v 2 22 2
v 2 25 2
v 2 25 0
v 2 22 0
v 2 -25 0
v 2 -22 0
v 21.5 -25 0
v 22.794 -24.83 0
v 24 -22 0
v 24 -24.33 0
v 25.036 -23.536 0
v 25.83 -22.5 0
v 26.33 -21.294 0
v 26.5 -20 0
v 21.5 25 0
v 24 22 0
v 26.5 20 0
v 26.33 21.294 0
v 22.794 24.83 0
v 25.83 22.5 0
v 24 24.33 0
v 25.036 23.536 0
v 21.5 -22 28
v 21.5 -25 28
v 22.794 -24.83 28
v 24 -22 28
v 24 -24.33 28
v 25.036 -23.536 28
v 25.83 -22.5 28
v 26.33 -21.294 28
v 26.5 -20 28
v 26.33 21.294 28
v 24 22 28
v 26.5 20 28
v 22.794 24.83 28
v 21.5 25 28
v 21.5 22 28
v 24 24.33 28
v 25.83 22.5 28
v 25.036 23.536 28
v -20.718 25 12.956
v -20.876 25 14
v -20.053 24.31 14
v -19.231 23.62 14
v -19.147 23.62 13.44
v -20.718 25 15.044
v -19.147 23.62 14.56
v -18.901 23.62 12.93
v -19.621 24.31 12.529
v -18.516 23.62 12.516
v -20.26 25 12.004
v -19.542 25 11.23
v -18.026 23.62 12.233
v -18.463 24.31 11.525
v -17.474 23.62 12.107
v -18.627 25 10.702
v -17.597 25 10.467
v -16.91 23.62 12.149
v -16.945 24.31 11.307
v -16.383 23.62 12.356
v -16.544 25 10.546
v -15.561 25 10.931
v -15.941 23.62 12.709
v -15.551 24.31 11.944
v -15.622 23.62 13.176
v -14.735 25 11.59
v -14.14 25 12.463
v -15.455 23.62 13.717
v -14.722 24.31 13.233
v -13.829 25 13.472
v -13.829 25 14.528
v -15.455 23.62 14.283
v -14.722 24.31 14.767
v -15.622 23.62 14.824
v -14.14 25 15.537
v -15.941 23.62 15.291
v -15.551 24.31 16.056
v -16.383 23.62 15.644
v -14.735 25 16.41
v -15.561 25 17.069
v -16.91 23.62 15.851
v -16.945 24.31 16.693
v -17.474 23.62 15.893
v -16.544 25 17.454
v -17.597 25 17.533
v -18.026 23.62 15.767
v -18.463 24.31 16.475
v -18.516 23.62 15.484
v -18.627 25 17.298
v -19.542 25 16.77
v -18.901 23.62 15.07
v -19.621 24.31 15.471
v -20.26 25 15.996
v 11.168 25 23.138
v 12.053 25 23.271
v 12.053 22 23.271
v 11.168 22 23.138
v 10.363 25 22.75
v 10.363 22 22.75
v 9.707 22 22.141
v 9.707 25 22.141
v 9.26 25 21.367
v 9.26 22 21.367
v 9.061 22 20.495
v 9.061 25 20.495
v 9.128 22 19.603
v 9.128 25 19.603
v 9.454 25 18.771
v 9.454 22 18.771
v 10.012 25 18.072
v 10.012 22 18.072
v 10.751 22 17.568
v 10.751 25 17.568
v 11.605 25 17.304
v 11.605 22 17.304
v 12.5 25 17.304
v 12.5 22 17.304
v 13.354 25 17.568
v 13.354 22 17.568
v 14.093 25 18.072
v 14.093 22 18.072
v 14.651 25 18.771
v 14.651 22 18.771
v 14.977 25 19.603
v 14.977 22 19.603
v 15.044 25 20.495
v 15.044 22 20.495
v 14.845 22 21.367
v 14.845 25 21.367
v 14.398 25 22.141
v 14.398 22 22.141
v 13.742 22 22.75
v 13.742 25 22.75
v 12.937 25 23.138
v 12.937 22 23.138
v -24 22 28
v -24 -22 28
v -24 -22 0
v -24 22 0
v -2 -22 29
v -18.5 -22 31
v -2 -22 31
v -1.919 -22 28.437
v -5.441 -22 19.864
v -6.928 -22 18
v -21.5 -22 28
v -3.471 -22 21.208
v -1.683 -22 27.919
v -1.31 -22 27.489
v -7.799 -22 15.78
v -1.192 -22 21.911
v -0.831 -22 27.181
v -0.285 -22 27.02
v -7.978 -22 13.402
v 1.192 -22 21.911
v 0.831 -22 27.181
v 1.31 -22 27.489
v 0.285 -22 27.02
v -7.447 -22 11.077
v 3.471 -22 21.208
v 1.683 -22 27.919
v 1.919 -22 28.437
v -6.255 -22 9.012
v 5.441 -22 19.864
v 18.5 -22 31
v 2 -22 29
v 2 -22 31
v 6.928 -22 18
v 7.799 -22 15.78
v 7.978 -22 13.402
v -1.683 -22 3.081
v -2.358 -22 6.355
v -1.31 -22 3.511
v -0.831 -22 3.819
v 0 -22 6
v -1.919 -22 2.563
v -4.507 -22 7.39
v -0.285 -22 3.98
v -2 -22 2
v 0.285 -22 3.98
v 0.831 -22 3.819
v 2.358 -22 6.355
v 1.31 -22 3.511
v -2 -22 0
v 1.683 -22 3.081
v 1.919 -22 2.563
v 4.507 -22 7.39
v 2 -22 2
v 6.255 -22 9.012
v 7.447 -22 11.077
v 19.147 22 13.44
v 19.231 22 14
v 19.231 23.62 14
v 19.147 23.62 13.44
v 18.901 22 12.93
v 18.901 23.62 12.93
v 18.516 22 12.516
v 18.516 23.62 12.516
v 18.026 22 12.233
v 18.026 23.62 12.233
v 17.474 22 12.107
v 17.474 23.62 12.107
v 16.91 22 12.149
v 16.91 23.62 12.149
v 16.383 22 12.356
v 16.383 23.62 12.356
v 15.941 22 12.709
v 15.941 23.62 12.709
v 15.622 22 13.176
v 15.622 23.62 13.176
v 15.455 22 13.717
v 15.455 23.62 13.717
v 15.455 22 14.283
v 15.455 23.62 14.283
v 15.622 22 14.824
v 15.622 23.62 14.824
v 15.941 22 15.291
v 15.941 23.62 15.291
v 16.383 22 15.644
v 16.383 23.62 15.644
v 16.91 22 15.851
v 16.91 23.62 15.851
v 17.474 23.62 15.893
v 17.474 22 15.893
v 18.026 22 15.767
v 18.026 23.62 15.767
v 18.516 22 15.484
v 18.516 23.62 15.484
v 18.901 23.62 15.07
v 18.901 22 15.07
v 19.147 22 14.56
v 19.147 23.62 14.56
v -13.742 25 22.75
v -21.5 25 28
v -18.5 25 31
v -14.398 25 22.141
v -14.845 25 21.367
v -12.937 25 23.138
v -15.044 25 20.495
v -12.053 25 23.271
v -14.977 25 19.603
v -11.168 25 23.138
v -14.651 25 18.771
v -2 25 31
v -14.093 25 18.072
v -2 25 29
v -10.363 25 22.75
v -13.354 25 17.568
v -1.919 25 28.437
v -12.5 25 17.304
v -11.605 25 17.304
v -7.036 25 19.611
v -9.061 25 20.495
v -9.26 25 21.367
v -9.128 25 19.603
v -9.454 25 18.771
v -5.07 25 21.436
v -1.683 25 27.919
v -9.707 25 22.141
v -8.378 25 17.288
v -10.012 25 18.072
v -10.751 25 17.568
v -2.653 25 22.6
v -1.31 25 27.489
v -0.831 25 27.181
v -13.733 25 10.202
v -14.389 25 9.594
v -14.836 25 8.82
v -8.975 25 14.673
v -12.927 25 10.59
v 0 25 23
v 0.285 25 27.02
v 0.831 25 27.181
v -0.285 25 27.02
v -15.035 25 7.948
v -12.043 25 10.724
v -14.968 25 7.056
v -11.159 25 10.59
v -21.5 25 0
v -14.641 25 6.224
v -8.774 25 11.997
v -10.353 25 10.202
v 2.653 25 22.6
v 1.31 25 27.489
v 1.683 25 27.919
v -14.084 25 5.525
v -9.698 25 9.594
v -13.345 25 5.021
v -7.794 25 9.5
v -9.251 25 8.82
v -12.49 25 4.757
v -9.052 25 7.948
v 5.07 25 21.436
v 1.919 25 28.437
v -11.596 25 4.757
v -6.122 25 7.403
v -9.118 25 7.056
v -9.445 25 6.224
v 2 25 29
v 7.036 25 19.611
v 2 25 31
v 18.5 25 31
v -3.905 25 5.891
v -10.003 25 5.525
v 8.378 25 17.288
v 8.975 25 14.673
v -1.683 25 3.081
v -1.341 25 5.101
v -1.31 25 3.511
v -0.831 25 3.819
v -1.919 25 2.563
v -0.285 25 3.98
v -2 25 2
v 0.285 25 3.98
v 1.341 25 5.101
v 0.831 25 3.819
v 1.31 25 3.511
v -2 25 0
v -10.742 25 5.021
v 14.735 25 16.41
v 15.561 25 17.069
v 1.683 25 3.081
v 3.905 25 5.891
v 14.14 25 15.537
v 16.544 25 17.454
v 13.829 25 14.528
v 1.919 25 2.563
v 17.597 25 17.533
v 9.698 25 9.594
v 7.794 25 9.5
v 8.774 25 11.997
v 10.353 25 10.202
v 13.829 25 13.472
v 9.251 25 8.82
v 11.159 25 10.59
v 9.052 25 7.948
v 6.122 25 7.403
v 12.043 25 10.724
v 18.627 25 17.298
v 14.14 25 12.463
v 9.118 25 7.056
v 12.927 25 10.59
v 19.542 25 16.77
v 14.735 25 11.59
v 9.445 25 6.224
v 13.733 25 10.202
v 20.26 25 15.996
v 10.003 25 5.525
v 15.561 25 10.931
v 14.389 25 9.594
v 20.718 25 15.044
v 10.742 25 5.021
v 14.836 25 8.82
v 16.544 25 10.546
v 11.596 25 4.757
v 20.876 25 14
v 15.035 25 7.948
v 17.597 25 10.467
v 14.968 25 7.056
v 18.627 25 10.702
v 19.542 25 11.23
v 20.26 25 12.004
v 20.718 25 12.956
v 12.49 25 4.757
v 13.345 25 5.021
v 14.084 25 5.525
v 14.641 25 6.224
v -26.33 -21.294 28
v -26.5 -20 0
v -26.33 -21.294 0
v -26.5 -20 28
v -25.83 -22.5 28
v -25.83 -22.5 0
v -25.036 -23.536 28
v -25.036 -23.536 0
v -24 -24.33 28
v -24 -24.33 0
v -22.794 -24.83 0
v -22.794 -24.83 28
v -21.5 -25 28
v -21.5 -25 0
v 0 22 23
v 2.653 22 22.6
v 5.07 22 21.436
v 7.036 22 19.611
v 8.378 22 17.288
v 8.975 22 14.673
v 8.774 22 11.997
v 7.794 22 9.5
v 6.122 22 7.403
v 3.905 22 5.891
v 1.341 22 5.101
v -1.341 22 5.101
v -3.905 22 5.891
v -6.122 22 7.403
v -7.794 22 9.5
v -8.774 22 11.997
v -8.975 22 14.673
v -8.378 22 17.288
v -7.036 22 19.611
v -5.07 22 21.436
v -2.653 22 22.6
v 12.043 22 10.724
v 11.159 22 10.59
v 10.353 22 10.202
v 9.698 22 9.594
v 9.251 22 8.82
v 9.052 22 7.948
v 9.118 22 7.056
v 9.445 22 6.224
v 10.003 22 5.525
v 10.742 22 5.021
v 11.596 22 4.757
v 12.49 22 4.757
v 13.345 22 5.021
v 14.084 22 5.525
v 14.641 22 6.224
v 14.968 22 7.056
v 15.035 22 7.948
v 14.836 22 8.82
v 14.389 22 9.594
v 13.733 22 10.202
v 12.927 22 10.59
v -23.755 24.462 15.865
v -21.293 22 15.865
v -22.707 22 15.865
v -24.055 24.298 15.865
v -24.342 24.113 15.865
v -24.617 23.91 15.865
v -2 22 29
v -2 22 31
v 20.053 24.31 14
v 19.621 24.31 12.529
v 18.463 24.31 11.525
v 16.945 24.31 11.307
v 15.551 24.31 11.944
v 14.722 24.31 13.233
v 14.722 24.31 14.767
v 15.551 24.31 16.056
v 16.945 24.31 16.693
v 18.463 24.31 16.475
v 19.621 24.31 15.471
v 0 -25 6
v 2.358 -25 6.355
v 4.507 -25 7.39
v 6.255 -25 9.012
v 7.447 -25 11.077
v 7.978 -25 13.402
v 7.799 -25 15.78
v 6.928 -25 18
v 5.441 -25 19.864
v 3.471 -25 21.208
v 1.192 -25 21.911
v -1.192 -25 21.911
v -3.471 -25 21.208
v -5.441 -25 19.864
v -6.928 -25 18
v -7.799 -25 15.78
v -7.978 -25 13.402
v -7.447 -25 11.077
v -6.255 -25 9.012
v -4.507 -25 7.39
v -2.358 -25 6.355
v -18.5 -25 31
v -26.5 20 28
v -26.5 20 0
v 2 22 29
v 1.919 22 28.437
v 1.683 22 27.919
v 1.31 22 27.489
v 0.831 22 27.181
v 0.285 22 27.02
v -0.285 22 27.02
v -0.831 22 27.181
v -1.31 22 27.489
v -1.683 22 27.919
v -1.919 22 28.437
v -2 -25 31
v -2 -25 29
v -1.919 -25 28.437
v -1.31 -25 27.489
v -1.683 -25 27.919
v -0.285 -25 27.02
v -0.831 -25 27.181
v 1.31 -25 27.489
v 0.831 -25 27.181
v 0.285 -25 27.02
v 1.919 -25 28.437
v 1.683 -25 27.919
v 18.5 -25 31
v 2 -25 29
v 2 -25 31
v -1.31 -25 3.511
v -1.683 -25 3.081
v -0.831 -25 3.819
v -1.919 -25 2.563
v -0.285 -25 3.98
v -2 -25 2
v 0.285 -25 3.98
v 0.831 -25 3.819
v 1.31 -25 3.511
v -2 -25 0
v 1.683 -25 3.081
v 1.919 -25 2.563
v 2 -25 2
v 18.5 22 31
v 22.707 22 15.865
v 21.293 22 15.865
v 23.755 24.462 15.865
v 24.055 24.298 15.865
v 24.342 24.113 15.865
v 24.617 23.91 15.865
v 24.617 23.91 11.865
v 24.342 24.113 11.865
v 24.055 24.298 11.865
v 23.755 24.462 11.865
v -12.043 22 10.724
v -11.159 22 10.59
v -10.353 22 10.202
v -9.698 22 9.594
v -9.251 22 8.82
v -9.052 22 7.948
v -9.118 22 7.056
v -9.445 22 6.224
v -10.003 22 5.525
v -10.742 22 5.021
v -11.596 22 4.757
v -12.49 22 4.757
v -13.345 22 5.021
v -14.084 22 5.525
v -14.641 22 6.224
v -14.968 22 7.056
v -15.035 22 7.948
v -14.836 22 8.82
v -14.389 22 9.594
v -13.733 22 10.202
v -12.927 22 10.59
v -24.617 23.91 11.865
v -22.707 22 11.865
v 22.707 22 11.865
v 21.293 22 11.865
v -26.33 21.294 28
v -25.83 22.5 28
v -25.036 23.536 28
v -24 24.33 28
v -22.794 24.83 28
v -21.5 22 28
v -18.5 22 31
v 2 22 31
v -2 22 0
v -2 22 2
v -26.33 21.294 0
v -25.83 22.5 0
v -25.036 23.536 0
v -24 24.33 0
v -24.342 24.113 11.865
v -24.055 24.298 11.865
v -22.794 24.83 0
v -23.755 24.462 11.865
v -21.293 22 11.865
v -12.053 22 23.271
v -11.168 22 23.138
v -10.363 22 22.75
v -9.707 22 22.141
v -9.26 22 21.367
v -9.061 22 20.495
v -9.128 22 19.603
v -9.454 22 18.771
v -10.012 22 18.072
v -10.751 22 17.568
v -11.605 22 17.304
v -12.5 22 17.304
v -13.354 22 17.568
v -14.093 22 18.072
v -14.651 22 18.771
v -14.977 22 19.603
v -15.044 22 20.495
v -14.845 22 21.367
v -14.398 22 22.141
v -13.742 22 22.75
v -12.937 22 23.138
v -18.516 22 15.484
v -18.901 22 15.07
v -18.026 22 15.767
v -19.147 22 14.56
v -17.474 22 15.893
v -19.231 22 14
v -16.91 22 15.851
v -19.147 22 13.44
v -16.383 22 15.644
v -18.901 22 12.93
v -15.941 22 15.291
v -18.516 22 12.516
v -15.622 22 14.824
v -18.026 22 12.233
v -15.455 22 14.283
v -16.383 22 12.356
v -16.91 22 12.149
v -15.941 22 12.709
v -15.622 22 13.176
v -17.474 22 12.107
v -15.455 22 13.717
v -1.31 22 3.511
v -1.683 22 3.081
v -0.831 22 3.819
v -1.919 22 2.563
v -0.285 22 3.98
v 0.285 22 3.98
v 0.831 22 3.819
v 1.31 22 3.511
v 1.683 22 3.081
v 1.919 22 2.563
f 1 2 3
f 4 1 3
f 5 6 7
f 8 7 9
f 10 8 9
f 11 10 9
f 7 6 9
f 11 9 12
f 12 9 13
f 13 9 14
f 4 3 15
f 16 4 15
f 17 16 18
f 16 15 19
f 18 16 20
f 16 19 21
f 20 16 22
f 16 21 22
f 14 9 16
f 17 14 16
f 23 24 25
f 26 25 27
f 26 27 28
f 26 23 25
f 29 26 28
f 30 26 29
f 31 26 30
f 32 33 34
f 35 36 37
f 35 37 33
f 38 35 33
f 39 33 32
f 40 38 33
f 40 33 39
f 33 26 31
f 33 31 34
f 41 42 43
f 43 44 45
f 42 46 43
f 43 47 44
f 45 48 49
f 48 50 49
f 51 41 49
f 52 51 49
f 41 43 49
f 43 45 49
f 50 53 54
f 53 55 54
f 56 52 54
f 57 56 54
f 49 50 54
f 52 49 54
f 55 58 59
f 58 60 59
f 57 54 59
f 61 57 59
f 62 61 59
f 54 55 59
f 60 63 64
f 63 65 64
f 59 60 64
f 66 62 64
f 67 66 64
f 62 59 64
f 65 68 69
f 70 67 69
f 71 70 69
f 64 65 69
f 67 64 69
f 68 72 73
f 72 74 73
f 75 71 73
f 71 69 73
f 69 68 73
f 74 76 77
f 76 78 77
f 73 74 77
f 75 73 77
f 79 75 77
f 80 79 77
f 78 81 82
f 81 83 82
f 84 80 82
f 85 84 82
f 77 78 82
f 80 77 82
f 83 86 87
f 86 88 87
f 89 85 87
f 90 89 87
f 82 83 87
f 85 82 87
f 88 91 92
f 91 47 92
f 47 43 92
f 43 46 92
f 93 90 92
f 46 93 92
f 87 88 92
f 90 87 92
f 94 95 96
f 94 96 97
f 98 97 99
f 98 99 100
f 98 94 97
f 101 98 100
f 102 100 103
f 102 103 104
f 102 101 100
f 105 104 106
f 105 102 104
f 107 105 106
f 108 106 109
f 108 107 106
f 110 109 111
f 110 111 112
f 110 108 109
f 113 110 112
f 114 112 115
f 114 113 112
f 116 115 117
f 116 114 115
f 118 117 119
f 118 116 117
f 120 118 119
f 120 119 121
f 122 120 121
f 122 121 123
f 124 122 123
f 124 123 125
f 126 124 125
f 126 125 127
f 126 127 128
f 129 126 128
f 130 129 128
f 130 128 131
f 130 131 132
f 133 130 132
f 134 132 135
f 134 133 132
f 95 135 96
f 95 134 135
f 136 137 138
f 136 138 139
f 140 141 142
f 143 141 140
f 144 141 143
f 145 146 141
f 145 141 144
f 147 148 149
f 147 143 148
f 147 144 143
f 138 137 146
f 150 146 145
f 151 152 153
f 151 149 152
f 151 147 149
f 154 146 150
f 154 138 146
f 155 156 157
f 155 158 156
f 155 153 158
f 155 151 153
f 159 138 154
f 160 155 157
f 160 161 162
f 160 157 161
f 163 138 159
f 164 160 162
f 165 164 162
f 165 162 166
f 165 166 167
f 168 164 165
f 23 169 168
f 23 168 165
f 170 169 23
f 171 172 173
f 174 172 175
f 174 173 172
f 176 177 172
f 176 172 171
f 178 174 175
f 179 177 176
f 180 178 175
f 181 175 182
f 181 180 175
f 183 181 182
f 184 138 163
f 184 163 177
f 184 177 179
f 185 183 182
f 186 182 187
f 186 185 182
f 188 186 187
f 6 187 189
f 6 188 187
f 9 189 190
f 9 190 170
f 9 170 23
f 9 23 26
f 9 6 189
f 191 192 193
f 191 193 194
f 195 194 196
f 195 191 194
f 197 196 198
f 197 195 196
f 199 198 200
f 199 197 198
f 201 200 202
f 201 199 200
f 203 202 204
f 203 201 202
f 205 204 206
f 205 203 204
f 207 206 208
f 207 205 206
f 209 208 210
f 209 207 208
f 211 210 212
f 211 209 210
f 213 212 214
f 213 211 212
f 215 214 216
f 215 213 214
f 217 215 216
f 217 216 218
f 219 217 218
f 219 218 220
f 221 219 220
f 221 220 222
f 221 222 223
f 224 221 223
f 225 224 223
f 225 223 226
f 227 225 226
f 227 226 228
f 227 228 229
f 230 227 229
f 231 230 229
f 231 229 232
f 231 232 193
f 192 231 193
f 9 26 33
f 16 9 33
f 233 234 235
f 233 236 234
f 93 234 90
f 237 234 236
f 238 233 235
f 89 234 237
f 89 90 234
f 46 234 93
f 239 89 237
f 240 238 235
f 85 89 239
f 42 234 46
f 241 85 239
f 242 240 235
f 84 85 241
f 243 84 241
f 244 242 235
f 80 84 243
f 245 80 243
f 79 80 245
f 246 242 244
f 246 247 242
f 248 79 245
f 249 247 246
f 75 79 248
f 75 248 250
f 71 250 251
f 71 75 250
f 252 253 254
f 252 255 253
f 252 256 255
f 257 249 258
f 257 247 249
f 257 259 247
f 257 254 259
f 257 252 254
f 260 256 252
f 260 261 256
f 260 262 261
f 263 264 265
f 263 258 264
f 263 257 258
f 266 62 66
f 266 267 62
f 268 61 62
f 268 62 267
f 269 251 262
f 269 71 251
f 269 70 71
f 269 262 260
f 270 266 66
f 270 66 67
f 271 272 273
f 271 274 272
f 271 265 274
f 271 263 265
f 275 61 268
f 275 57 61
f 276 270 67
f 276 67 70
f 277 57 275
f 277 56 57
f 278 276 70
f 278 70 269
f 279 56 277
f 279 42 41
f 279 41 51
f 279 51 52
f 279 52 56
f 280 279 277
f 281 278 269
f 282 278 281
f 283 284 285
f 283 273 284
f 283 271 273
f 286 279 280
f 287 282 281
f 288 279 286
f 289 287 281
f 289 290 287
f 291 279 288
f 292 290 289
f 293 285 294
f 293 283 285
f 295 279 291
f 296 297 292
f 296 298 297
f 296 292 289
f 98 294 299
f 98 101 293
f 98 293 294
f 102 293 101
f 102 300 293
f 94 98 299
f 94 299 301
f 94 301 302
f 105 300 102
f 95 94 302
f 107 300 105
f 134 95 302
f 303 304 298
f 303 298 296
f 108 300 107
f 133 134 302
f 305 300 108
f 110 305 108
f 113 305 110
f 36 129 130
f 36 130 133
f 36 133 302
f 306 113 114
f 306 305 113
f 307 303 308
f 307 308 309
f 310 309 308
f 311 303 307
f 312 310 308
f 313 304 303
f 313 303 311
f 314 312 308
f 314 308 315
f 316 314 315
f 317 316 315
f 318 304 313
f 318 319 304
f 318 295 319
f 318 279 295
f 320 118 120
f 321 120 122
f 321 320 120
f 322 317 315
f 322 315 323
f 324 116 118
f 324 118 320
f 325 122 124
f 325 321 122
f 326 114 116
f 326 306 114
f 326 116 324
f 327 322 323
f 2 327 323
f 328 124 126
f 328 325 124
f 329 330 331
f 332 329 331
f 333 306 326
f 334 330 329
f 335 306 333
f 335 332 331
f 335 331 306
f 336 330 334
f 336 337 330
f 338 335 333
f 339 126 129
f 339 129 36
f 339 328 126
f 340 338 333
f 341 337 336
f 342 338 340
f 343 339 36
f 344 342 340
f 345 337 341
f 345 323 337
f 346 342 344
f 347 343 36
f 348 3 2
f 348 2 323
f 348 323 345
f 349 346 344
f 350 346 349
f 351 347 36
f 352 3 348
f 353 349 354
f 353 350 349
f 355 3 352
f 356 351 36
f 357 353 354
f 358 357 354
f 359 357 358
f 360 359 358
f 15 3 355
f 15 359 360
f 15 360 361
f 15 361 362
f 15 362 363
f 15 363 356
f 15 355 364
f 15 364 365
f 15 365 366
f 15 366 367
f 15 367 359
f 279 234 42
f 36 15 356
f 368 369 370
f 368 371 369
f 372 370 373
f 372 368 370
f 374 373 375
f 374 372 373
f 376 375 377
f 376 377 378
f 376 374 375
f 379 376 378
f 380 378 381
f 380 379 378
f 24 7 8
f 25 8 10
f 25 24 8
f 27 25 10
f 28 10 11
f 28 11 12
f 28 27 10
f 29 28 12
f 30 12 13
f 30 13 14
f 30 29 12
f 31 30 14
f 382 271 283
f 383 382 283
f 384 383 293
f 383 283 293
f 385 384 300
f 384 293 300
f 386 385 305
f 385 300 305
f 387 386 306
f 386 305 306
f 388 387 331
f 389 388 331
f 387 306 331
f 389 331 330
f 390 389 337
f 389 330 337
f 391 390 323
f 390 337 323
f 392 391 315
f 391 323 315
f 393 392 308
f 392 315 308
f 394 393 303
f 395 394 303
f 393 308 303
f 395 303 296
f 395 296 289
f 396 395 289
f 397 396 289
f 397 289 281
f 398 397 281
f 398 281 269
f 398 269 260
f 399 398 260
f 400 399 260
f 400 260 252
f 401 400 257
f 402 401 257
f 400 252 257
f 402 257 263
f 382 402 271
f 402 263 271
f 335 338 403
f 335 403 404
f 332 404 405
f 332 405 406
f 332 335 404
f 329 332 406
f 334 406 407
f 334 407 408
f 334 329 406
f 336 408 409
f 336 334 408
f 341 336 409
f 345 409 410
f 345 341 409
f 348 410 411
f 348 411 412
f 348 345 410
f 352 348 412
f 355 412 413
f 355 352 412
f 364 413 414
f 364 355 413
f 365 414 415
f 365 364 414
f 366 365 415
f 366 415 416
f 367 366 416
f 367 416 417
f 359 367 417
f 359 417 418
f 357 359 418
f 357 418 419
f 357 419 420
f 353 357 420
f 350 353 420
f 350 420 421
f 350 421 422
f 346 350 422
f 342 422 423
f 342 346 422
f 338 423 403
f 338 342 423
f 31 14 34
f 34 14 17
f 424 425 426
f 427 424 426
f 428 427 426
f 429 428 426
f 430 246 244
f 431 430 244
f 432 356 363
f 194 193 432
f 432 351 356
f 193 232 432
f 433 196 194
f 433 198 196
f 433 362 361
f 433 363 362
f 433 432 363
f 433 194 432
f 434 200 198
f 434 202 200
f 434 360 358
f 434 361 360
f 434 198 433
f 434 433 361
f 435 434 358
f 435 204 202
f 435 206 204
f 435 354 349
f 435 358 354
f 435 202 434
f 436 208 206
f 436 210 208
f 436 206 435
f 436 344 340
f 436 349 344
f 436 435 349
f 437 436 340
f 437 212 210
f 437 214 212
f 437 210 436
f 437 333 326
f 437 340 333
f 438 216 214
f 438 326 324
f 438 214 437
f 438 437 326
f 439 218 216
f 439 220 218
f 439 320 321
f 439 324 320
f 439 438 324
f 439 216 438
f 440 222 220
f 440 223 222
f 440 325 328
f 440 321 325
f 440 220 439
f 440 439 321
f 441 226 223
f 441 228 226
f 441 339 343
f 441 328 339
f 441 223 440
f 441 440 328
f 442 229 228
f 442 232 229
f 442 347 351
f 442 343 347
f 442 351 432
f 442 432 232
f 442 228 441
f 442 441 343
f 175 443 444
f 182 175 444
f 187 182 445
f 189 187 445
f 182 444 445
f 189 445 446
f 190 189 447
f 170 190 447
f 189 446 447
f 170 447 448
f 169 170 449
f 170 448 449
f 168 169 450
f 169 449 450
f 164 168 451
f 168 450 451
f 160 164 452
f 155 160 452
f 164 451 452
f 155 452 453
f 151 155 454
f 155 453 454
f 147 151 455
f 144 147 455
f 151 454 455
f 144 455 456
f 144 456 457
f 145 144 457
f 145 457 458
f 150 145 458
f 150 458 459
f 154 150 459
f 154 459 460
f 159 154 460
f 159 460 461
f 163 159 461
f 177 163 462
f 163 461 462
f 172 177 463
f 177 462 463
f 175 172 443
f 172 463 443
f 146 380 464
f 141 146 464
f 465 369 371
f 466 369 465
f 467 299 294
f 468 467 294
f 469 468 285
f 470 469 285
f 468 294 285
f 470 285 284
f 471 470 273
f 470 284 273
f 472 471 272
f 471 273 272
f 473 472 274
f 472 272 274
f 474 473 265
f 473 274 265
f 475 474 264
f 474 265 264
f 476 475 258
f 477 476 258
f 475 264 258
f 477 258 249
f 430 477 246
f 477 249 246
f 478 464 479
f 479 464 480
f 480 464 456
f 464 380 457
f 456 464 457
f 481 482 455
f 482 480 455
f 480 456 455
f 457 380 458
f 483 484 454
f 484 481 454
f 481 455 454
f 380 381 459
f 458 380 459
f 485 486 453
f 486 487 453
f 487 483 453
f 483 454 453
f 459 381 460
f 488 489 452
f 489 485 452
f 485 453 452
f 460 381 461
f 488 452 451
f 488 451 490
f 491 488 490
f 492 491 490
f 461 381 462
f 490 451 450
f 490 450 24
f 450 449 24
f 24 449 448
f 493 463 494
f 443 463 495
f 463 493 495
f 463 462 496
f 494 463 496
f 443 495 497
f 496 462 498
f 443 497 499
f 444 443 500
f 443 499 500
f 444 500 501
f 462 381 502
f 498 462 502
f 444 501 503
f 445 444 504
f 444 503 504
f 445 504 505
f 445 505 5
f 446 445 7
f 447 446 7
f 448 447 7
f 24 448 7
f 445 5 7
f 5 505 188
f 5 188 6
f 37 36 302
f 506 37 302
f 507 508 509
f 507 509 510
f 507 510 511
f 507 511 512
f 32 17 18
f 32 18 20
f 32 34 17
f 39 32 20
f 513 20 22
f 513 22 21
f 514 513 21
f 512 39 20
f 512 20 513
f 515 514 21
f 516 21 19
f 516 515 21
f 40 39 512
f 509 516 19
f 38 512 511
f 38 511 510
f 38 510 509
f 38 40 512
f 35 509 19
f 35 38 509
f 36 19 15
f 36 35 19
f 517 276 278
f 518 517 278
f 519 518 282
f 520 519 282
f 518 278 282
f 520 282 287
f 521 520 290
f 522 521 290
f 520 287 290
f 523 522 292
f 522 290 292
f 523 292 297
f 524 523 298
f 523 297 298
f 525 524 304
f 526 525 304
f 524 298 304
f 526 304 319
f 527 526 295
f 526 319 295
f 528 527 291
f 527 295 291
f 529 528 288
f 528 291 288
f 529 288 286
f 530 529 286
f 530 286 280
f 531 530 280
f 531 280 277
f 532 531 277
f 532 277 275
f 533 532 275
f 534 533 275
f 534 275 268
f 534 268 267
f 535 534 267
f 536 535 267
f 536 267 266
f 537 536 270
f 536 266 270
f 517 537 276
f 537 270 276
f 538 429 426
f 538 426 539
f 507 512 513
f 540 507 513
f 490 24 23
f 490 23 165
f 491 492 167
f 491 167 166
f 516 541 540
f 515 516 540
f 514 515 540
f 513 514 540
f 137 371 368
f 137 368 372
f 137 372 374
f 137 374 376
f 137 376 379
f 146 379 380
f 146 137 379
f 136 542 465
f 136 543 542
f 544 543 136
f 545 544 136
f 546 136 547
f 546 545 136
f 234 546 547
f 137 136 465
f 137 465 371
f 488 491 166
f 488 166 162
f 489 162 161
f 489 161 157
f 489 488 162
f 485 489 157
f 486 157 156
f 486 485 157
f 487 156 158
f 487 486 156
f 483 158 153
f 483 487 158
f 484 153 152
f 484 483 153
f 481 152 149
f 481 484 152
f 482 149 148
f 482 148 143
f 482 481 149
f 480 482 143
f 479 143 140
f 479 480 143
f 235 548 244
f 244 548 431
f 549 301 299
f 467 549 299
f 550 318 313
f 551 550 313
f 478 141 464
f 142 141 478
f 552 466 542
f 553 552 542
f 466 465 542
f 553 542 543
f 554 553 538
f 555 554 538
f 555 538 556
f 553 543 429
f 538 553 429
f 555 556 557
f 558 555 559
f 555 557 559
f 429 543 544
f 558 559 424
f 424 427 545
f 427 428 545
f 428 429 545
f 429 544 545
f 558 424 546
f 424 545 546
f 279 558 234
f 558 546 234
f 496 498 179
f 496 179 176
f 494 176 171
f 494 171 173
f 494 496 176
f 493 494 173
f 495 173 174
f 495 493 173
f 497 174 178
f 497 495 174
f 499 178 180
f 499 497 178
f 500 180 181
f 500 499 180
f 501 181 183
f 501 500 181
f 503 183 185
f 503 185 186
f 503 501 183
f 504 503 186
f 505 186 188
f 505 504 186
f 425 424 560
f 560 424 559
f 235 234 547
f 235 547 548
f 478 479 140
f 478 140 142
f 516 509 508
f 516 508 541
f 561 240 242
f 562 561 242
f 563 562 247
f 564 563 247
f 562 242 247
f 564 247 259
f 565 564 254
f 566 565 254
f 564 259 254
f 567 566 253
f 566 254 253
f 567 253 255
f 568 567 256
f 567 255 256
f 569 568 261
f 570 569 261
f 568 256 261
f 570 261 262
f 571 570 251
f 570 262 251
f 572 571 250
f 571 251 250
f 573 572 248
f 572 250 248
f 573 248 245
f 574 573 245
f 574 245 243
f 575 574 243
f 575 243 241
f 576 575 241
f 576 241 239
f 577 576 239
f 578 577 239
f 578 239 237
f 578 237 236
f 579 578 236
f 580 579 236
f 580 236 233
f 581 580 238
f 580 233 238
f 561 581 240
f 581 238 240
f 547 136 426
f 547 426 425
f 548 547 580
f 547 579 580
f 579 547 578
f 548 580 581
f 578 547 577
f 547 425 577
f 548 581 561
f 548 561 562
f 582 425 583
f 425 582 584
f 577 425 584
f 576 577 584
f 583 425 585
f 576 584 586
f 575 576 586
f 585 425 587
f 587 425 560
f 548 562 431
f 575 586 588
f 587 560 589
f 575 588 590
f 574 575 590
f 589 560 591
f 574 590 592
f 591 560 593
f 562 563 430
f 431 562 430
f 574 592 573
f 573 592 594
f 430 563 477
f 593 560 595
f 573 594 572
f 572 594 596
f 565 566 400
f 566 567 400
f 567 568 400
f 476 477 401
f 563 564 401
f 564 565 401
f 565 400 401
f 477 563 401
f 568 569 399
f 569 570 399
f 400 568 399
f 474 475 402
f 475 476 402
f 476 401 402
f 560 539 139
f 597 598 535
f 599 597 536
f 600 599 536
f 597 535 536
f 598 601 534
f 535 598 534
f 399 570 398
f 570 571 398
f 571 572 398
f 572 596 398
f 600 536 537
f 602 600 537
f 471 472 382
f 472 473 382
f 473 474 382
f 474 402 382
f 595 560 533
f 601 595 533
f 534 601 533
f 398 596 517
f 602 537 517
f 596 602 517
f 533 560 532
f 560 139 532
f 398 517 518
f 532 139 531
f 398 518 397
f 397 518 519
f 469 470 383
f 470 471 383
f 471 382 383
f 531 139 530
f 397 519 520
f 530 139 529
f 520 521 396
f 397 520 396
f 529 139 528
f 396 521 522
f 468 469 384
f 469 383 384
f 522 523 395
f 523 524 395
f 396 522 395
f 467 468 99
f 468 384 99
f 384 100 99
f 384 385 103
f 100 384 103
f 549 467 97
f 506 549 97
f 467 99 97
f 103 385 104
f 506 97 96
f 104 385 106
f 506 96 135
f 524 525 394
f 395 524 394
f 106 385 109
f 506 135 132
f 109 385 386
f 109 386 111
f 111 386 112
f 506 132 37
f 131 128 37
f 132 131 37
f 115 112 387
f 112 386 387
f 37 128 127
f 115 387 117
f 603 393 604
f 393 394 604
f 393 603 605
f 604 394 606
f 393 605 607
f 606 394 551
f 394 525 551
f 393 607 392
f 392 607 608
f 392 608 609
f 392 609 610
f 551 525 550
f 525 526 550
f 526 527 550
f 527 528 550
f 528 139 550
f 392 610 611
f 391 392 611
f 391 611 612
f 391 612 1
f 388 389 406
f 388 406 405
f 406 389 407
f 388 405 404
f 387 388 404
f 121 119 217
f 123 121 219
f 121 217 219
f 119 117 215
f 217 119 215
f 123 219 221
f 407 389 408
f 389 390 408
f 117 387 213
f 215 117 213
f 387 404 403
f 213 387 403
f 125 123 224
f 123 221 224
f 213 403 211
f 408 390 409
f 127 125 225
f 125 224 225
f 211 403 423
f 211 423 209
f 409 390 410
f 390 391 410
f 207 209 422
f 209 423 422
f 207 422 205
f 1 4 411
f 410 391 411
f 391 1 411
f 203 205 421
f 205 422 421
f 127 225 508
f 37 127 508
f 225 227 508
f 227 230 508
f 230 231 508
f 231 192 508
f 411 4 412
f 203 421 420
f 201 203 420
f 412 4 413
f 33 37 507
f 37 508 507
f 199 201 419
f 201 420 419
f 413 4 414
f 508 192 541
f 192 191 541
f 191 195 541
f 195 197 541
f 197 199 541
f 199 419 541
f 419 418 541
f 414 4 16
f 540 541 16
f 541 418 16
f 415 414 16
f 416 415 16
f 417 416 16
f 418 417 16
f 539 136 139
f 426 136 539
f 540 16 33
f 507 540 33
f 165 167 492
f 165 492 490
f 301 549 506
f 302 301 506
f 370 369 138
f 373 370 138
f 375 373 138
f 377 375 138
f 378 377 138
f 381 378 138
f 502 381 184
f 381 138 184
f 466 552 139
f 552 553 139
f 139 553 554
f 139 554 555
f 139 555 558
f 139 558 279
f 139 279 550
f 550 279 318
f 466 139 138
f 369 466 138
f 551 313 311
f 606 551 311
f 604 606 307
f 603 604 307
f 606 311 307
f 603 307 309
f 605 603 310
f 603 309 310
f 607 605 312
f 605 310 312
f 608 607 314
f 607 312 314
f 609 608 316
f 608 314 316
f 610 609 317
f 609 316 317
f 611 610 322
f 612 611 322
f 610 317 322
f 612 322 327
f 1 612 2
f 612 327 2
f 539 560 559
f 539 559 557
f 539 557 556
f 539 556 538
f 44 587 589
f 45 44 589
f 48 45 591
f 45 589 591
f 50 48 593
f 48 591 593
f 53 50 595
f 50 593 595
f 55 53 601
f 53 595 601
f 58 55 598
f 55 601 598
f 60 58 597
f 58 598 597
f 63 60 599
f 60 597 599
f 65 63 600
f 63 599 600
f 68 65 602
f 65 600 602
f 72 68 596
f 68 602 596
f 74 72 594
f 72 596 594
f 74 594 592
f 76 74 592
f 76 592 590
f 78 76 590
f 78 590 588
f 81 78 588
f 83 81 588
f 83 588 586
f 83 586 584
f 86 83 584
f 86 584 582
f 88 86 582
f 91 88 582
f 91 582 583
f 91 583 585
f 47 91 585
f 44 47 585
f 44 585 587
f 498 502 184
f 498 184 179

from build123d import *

# Parameters (mm, degrees)
SKETCH1_W                                         = 53
SKETCH1_H                                         = 50
BOSS_EXTRUDE1_DEPTH                               = 28
FILLET1_R                                         = 5
SKETCH2_W                                         = 48
SKETCH2_H                                         = 44
CUT_EXTRUDE1_DEPTH                                = 28
SKETCH3_W                                         = 43
SKETCH3_H                                         = 3
BOSS_EXTRUDE2_DEPTH                               = 3
CUT_EXTRUDE2_DEPTH                                = 3
SKETCH10_R                                        = 8
CUT_EXTRUDE3_DEPTH                                = 3
CUT_EXTRUDE4_DEPTH                                = 3
CUT_EXTRUDE5_DEPTH                                = 3
MIRROR2_COPY_1_DEPTH                              = 3
SKETCH13_R                                        = 9
CUT_EXTRUDE12_DEPTH                               = 3
SKETCH14_R                                        = 3
CUT_EXTRUDE13_DEPTH                               = 3
SKETCH15_R                                        = 3
CUT_EXTRUDE14_DEPTH                               = 3
SKETCH39_W                                        = 4
SKETCH39_H                                        = 1
CUT_EXTRUDE15_DEPTH                               = 5
CSK_FOR_6_FLAT_HEAD_MACHINE_SCREW_100_D           = 3.7973
CSK_FOR_6_FLAT_HEAD_MACHINE_SCREW_100_DEPTH       = 3
CSK_FOR_6_FLAT_HEAD_MACHINE_SCREW_100_CSINK_D     = 7.0866
CSK_FOR_6_FLAT_HEAD_MACHINE_SCREW_100_CSINK_ANGLE = 100


with BuildPart() as part:
    # Sketch1 → Boss-Extrude1 (new body)
    with BuildSketch(Plane.XY):
        Rectangle(SKETCH1_W, SKETCH1_H)
    extrude(amount=BOSS_EXTRUDE1_DEPTH)

    # Fillet1
    fillet1_edges = [part.edges().sort_by_distance(p)[0] for p in [
        (26.5, -25, 14),
        (-26.5, -25, 14),
        (-26.5, 25, 14),
        (26.5, 25, 14),
    ]]
    fillet(fillet1_edges, radius=FILLET1_R)

    # Sketch2 → Cut-Extrude1 (cut)
    with BuildSketch(Plane.XY.offset(28)):
        Rectangle(SKETCH2_W, SKETCH2_H)
    extrude(amount=-CUT_EXTRUDE1_DEPTH, mode=Mode.SUBTRACT)

    # Sketch3 → Boss-Extrude2 (add)
    with BuildSketch(Plane.XY.offset(28)):
        with Locations((0, -23.5)):
            Rectangle(SKETCH3_W, SKETCH3_H)
    boss_extrude2 = extrude(amount=BOSS_EXTRUDE2_DEPTH)

    # Sketch9 → Cut-Extrude2 (cut)
    with BuildSketch(Plane.XZ.offset(25)):
        Polygon((21.5, 28), (18.5, 31), (21.5, 31), align=None)
    cut_extrude2 = extrude(amount=-CUT_EXTRUDE2_DEPTH, mode=Mode.SUBTRACT)

    # Mirror1: Cut-Extrude2 across plane
    add(cut_extrude2.mirror(Plane(origin=(0, 0, 0), x_dir=(0, 0, 1), z_dir=(1, 0, 0))), mode=Mode.SUBTRACT)

    # Sketch10 → Cut-Extrude3 (cut)
    with BuildSketch(Plane(origin=(0, -25, 0), x_dir=(-1, 0, 0), z_dir=(0, -1, 0))):
        with Locations(Location((0, -14, 0), (0, 0, 90))):
            Circle(SKETCH10_R)
    extrude(amount=-CUT_EXTRUDE3_DEPTH, mode=Mode.SUBTRACT)

    # Sketch11 → Cut-Extrude4 (cut)
    with BuildSketch(Plane.XZ.offset(25)):
        with BuildLine():
            Line((2, 31), (2, 29))
            ThreePointArc((2, 29), (0, 27), (-2, 29))
            Line((-2, 29), (-2, 31))
            ThreePointArc((-2, 31), (0, 33), (2, 31))
        make_face()
    cut_extrude4 = extrude(amount=-CUT_EXTRUDE4_DEPTH, mode=Mode.SUBTRACT)

    # Sketch12 → Cut-Extrude5 (cut)
    with BuildSketch(Plane.XZ.offset(25)):
        with BuildLine():
            Line((-2, 0), (-2, 2))
            ThreePointArc((-2, 2), (0, 4), (2, 2))
            Line((2, 2), (2, 0))
            ThreePointArc((2, 0), (0, -2), (-2, 0))
        make_face()
    cut_extrude5 = extrude(amount=-CUT_EXTRUDE5_DEPTH, mode=Mode.SUBTRACT)

    # Mirror2: Boss-Extrude2, Cut-Extrude2, Cut-Extrude4, Cut-Extrude5 across plane
    add(boss_extrude2.mirror(Plane.ZX))
    add(cut_extrude2.mirror(Plane.ZX), mode=Mode.SUBTRACT)
    add(cut_extrude4.mirror(Plane.ZX), mode=Mode.SUBTRACT)
    add(cut_extrude5.mirror(Plane.ZX), mode=Mode.SUBTRACT)

    # Mirror2 copy 1 sketch → Mirror2 copy 1 (cut)
    with BuildSketch(Plane(origin=(0, 25, 0), x_dir=(-1, 0, 0), z_dir=(0, 1, 0))):
        Polygon((21.5, 28), (18.5, 31), (21.5, 31), align=None)
    extrude(amount=-MIRROR2_COPY_1_DEPTH, mode=Mode.SUBTRACT)

    # Sketch13 → Cut-Extrude12 (cut)
    with BuildSketch(Plane(origin=(0, 25, 0), x_dir=(1, 0, 0), z_dir=(0, 1, 0))):
        with Locations(Location((0, -14, 0), (0, 0, 270))):
            Circle(SKETCH13_R)
    extrude(amount=-CUT_EXTRUDE12_DEPTH, mode=Mode.SUBTRACT)

    # Sketch14 → Cut-Extrude13 (cut)
    with BuildSketch(Plane(origin=(0, 25, 0), x_dir=(1, 0, 0), z_dir=(0, 1, 0))):
        with Locations(Location((-12.052516567, -20.270787808, 0), (0, 0, 270))):
            Circle(SKETCH14_R)
    cut_extrude13 = extrude(amount=-CUT_EXTRUDE13_DEPTH, mode=Mode.SUBTRACT)

    # Sketch15 → Cut-Extrude14 (cut)
    with BuildSketch(Plane(origin=(0, 25, 0), x_dir=(1, 0, 0), z_dir=(0, 1, 0))):
        with Locations(Location((-12.043222485, -7.723673845, 0), (0, 0, 270))):
            Circle(SKETCH15_R)
    cut_extrude14 = extrude(amount=-CUT_EXTRUDE14_DEPTH, mode=Mode.SUBTRACT)

    # Sketch39 → Cut-Extrude15 (cut)
    with BuildSketch(Plane(origin=(-24.285533906, 24.285533906, 0), x_dir=(0, 0, -1), z_dir=(-0.7071067811865464, 0.7071067811865488, 0))):
        with Locations((-13.86492965, 0)):
            Rectangle(SKETCH39_W, SKETCH39_H)
    cut_extrude15 = extrude(amount=-CUT_EXTRUDE15_DEPTH, mode=Mode.SUBTRACT)

    # CSK for #6 Flat Head Machine Screw (100)1
    with Locations(Plane(origin=(0, 25, 0), x_dir=(1, 0, 0), z_dir=(0, 1, 0))):
        with Locations((-17.332413571, -14)):
            csk_for_6_flat_head_machine_screw_100 = CounterSinkHole(CSK_FOR_6_FLAT_HEAD_MACHINE_SCREW_100_D / 2, CSK_FOR_6_FLAT_HEAD_MACHINE_SCREW_100_CSINK_D / 2, depth=CSK_FOR_6_FLAT_HEAD_MACHINE_SCREW_100_DEPTH, counter_sink_angle=CSK_FOR_6_FLAT_HEAD_MACHINE_SCREW_100_CSINK_ANGLE)

    # Mirror3: Cut-Extrude13, Cut-Extrude14, Cut-Extrude15, CSK for #6 Flat Head Machine Screw (100)1 across plane
    add(cut_extrude13.mirror(Plane(origin=(0, 0, 0), x_dir=(0, 0, 1), z_dir=(1, 0, 0))), mode=Mode.SUBTRACT)
    add(cut_extrude14.mirror(Plane(origin=(0, 0, 0), x_dir=(0, 0, 1), z_dir=(1, 0, 0))), mode=Mode.SUBTRACT)
    add(cut_extrude15.mirror(Plane(origin=(0, 0, 0), x_dir=(0, 0, 1), z_dir=(1, 0, 0))), mode=Mode.SUBTRACT)
    add(csk_for_6_flat_head_machine_screw_100.mirror(Plane(origin=(0, 0, 0), x_dir=(0, 0, 1), z_dir=(1, 0, 0))), mode=Mode.SUBTRACT)


solid = part.part
